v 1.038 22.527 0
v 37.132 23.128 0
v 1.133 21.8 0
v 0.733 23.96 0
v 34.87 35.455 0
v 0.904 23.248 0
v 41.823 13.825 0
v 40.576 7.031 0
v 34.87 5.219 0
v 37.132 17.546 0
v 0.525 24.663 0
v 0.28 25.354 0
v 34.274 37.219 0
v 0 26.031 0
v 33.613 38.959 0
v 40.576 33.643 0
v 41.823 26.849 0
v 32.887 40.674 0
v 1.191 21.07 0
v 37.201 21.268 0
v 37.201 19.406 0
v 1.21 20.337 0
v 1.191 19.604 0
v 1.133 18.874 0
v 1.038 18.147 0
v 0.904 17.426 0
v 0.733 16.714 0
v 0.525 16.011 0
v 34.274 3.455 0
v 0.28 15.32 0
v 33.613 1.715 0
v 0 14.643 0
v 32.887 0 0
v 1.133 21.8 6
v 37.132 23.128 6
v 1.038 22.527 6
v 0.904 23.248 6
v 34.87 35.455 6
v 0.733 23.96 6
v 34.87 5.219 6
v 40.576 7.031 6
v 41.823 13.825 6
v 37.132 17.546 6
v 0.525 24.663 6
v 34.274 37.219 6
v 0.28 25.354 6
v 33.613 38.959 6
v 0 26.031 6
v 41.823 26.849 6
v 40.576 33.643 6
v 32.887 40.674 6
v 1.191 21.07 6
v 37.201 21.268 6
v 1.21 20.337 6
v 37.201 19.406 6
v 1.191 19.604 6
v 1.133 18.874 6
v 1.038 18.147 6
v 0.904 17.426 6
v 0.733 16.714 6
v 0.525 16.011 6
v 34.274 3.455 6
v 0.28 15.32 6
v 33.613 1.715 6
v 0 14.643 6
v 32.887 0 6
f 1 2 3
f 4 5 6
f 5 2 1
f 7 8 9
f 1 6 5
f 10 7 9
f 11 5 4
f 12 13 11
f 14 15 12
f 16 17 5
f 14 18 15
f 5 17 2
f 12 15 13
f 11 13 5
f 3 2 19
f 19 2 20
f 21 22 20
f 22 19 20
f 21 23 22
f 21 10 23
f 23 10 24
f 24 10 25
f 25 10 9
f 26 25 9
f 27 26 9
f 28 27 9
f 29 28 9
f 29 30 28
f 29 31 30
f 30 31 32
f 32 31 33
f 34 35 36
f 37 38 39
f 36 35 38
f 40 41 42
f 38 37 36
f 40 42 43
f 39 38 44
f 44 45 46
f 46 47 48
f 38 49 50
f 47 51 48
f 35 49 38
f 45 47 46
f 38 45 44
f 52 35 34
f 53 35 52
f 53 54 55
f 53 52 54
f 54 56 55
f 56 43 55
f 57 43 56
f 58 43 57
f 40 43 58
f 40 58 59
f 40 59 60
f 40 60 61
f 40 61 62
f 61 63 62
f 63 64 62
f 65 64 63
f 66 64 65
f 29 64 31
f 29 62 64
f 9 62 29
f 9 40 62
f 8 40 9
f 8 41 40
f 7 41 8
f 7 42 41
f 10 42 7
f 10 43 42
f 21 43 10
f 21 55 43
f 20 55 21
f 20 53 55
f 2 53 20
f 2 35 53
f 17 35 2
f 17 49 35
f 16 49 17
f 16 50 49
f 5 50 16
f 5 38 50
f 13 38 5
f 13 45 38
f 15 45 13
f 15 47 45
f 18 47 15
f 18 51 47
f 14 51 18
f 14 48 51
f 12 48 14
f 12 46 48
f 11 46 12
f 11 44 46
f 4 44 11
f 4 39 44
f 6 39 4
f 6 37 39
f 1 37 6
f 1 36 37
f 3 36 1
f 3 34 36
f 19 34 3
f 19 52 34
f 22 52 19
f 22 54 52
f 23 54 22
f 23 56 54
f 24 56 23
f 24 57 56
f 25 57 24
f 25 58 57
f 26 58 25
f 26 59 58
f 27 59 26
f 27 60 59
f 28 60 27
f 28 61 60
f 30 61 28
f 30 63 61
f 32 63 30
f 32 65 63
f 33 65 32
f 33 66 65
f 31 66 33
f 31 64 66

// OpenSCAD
$fn = 32;

// ----------------------------------------------------------------------
// Gear sector: 2 teeth on 48 degrees
// ----------------------------------------------------------------------

// --- parameters (mm) ---
sector_angle = 48;        // sector angle, degrees
root_r = 50;              // root circle radius
tooth_h = 5;              // tooth height over the root circle
teeth = 2;                // number of teeth on the sector
hub_r = 14;               // hub bore radius
plate_t = 6;              // sector thickness, Z
arc_step = 3;             // sampling step of the root/hub arcs, degrees

tip_r = root_r + tooth_h;  // tip circle radius

profile = [[32.887, 0], [33.613, 1.715], [34.274, 3.455], [34.87, 5.219], [40.576, 7.031], [41.823, 13.825], [37.132, 17.546], [37.201, 19.406], [37.201, 21.268], [37.132, 23.128], [41.823, 26.849], [40.576, 33.643], [34.87, 35.455], [34.274, 37.219], [33.613, 38.959], [32.887, 40.674], [0, 26.031], [0.28, 25.354], [0.525, 24.663], [0.733, 23.96], [0.904, 23.248], [1.038, 22.527], [1.133, 21.8], [1.191, 21.07], [1.21, 20.337], [1.191, 19.604], [1.133, 18.874], [1.038, 18.147], [0.904, 17.426], [0.733, 16.714], [0.525, 16.011], [0.28, 15.32], [0, 14.643]];  // primary outline, 33 points, counter clockwise

// --- the one profile operation ---
linear_extrude(height = plate_t) polygon(points = profile);
